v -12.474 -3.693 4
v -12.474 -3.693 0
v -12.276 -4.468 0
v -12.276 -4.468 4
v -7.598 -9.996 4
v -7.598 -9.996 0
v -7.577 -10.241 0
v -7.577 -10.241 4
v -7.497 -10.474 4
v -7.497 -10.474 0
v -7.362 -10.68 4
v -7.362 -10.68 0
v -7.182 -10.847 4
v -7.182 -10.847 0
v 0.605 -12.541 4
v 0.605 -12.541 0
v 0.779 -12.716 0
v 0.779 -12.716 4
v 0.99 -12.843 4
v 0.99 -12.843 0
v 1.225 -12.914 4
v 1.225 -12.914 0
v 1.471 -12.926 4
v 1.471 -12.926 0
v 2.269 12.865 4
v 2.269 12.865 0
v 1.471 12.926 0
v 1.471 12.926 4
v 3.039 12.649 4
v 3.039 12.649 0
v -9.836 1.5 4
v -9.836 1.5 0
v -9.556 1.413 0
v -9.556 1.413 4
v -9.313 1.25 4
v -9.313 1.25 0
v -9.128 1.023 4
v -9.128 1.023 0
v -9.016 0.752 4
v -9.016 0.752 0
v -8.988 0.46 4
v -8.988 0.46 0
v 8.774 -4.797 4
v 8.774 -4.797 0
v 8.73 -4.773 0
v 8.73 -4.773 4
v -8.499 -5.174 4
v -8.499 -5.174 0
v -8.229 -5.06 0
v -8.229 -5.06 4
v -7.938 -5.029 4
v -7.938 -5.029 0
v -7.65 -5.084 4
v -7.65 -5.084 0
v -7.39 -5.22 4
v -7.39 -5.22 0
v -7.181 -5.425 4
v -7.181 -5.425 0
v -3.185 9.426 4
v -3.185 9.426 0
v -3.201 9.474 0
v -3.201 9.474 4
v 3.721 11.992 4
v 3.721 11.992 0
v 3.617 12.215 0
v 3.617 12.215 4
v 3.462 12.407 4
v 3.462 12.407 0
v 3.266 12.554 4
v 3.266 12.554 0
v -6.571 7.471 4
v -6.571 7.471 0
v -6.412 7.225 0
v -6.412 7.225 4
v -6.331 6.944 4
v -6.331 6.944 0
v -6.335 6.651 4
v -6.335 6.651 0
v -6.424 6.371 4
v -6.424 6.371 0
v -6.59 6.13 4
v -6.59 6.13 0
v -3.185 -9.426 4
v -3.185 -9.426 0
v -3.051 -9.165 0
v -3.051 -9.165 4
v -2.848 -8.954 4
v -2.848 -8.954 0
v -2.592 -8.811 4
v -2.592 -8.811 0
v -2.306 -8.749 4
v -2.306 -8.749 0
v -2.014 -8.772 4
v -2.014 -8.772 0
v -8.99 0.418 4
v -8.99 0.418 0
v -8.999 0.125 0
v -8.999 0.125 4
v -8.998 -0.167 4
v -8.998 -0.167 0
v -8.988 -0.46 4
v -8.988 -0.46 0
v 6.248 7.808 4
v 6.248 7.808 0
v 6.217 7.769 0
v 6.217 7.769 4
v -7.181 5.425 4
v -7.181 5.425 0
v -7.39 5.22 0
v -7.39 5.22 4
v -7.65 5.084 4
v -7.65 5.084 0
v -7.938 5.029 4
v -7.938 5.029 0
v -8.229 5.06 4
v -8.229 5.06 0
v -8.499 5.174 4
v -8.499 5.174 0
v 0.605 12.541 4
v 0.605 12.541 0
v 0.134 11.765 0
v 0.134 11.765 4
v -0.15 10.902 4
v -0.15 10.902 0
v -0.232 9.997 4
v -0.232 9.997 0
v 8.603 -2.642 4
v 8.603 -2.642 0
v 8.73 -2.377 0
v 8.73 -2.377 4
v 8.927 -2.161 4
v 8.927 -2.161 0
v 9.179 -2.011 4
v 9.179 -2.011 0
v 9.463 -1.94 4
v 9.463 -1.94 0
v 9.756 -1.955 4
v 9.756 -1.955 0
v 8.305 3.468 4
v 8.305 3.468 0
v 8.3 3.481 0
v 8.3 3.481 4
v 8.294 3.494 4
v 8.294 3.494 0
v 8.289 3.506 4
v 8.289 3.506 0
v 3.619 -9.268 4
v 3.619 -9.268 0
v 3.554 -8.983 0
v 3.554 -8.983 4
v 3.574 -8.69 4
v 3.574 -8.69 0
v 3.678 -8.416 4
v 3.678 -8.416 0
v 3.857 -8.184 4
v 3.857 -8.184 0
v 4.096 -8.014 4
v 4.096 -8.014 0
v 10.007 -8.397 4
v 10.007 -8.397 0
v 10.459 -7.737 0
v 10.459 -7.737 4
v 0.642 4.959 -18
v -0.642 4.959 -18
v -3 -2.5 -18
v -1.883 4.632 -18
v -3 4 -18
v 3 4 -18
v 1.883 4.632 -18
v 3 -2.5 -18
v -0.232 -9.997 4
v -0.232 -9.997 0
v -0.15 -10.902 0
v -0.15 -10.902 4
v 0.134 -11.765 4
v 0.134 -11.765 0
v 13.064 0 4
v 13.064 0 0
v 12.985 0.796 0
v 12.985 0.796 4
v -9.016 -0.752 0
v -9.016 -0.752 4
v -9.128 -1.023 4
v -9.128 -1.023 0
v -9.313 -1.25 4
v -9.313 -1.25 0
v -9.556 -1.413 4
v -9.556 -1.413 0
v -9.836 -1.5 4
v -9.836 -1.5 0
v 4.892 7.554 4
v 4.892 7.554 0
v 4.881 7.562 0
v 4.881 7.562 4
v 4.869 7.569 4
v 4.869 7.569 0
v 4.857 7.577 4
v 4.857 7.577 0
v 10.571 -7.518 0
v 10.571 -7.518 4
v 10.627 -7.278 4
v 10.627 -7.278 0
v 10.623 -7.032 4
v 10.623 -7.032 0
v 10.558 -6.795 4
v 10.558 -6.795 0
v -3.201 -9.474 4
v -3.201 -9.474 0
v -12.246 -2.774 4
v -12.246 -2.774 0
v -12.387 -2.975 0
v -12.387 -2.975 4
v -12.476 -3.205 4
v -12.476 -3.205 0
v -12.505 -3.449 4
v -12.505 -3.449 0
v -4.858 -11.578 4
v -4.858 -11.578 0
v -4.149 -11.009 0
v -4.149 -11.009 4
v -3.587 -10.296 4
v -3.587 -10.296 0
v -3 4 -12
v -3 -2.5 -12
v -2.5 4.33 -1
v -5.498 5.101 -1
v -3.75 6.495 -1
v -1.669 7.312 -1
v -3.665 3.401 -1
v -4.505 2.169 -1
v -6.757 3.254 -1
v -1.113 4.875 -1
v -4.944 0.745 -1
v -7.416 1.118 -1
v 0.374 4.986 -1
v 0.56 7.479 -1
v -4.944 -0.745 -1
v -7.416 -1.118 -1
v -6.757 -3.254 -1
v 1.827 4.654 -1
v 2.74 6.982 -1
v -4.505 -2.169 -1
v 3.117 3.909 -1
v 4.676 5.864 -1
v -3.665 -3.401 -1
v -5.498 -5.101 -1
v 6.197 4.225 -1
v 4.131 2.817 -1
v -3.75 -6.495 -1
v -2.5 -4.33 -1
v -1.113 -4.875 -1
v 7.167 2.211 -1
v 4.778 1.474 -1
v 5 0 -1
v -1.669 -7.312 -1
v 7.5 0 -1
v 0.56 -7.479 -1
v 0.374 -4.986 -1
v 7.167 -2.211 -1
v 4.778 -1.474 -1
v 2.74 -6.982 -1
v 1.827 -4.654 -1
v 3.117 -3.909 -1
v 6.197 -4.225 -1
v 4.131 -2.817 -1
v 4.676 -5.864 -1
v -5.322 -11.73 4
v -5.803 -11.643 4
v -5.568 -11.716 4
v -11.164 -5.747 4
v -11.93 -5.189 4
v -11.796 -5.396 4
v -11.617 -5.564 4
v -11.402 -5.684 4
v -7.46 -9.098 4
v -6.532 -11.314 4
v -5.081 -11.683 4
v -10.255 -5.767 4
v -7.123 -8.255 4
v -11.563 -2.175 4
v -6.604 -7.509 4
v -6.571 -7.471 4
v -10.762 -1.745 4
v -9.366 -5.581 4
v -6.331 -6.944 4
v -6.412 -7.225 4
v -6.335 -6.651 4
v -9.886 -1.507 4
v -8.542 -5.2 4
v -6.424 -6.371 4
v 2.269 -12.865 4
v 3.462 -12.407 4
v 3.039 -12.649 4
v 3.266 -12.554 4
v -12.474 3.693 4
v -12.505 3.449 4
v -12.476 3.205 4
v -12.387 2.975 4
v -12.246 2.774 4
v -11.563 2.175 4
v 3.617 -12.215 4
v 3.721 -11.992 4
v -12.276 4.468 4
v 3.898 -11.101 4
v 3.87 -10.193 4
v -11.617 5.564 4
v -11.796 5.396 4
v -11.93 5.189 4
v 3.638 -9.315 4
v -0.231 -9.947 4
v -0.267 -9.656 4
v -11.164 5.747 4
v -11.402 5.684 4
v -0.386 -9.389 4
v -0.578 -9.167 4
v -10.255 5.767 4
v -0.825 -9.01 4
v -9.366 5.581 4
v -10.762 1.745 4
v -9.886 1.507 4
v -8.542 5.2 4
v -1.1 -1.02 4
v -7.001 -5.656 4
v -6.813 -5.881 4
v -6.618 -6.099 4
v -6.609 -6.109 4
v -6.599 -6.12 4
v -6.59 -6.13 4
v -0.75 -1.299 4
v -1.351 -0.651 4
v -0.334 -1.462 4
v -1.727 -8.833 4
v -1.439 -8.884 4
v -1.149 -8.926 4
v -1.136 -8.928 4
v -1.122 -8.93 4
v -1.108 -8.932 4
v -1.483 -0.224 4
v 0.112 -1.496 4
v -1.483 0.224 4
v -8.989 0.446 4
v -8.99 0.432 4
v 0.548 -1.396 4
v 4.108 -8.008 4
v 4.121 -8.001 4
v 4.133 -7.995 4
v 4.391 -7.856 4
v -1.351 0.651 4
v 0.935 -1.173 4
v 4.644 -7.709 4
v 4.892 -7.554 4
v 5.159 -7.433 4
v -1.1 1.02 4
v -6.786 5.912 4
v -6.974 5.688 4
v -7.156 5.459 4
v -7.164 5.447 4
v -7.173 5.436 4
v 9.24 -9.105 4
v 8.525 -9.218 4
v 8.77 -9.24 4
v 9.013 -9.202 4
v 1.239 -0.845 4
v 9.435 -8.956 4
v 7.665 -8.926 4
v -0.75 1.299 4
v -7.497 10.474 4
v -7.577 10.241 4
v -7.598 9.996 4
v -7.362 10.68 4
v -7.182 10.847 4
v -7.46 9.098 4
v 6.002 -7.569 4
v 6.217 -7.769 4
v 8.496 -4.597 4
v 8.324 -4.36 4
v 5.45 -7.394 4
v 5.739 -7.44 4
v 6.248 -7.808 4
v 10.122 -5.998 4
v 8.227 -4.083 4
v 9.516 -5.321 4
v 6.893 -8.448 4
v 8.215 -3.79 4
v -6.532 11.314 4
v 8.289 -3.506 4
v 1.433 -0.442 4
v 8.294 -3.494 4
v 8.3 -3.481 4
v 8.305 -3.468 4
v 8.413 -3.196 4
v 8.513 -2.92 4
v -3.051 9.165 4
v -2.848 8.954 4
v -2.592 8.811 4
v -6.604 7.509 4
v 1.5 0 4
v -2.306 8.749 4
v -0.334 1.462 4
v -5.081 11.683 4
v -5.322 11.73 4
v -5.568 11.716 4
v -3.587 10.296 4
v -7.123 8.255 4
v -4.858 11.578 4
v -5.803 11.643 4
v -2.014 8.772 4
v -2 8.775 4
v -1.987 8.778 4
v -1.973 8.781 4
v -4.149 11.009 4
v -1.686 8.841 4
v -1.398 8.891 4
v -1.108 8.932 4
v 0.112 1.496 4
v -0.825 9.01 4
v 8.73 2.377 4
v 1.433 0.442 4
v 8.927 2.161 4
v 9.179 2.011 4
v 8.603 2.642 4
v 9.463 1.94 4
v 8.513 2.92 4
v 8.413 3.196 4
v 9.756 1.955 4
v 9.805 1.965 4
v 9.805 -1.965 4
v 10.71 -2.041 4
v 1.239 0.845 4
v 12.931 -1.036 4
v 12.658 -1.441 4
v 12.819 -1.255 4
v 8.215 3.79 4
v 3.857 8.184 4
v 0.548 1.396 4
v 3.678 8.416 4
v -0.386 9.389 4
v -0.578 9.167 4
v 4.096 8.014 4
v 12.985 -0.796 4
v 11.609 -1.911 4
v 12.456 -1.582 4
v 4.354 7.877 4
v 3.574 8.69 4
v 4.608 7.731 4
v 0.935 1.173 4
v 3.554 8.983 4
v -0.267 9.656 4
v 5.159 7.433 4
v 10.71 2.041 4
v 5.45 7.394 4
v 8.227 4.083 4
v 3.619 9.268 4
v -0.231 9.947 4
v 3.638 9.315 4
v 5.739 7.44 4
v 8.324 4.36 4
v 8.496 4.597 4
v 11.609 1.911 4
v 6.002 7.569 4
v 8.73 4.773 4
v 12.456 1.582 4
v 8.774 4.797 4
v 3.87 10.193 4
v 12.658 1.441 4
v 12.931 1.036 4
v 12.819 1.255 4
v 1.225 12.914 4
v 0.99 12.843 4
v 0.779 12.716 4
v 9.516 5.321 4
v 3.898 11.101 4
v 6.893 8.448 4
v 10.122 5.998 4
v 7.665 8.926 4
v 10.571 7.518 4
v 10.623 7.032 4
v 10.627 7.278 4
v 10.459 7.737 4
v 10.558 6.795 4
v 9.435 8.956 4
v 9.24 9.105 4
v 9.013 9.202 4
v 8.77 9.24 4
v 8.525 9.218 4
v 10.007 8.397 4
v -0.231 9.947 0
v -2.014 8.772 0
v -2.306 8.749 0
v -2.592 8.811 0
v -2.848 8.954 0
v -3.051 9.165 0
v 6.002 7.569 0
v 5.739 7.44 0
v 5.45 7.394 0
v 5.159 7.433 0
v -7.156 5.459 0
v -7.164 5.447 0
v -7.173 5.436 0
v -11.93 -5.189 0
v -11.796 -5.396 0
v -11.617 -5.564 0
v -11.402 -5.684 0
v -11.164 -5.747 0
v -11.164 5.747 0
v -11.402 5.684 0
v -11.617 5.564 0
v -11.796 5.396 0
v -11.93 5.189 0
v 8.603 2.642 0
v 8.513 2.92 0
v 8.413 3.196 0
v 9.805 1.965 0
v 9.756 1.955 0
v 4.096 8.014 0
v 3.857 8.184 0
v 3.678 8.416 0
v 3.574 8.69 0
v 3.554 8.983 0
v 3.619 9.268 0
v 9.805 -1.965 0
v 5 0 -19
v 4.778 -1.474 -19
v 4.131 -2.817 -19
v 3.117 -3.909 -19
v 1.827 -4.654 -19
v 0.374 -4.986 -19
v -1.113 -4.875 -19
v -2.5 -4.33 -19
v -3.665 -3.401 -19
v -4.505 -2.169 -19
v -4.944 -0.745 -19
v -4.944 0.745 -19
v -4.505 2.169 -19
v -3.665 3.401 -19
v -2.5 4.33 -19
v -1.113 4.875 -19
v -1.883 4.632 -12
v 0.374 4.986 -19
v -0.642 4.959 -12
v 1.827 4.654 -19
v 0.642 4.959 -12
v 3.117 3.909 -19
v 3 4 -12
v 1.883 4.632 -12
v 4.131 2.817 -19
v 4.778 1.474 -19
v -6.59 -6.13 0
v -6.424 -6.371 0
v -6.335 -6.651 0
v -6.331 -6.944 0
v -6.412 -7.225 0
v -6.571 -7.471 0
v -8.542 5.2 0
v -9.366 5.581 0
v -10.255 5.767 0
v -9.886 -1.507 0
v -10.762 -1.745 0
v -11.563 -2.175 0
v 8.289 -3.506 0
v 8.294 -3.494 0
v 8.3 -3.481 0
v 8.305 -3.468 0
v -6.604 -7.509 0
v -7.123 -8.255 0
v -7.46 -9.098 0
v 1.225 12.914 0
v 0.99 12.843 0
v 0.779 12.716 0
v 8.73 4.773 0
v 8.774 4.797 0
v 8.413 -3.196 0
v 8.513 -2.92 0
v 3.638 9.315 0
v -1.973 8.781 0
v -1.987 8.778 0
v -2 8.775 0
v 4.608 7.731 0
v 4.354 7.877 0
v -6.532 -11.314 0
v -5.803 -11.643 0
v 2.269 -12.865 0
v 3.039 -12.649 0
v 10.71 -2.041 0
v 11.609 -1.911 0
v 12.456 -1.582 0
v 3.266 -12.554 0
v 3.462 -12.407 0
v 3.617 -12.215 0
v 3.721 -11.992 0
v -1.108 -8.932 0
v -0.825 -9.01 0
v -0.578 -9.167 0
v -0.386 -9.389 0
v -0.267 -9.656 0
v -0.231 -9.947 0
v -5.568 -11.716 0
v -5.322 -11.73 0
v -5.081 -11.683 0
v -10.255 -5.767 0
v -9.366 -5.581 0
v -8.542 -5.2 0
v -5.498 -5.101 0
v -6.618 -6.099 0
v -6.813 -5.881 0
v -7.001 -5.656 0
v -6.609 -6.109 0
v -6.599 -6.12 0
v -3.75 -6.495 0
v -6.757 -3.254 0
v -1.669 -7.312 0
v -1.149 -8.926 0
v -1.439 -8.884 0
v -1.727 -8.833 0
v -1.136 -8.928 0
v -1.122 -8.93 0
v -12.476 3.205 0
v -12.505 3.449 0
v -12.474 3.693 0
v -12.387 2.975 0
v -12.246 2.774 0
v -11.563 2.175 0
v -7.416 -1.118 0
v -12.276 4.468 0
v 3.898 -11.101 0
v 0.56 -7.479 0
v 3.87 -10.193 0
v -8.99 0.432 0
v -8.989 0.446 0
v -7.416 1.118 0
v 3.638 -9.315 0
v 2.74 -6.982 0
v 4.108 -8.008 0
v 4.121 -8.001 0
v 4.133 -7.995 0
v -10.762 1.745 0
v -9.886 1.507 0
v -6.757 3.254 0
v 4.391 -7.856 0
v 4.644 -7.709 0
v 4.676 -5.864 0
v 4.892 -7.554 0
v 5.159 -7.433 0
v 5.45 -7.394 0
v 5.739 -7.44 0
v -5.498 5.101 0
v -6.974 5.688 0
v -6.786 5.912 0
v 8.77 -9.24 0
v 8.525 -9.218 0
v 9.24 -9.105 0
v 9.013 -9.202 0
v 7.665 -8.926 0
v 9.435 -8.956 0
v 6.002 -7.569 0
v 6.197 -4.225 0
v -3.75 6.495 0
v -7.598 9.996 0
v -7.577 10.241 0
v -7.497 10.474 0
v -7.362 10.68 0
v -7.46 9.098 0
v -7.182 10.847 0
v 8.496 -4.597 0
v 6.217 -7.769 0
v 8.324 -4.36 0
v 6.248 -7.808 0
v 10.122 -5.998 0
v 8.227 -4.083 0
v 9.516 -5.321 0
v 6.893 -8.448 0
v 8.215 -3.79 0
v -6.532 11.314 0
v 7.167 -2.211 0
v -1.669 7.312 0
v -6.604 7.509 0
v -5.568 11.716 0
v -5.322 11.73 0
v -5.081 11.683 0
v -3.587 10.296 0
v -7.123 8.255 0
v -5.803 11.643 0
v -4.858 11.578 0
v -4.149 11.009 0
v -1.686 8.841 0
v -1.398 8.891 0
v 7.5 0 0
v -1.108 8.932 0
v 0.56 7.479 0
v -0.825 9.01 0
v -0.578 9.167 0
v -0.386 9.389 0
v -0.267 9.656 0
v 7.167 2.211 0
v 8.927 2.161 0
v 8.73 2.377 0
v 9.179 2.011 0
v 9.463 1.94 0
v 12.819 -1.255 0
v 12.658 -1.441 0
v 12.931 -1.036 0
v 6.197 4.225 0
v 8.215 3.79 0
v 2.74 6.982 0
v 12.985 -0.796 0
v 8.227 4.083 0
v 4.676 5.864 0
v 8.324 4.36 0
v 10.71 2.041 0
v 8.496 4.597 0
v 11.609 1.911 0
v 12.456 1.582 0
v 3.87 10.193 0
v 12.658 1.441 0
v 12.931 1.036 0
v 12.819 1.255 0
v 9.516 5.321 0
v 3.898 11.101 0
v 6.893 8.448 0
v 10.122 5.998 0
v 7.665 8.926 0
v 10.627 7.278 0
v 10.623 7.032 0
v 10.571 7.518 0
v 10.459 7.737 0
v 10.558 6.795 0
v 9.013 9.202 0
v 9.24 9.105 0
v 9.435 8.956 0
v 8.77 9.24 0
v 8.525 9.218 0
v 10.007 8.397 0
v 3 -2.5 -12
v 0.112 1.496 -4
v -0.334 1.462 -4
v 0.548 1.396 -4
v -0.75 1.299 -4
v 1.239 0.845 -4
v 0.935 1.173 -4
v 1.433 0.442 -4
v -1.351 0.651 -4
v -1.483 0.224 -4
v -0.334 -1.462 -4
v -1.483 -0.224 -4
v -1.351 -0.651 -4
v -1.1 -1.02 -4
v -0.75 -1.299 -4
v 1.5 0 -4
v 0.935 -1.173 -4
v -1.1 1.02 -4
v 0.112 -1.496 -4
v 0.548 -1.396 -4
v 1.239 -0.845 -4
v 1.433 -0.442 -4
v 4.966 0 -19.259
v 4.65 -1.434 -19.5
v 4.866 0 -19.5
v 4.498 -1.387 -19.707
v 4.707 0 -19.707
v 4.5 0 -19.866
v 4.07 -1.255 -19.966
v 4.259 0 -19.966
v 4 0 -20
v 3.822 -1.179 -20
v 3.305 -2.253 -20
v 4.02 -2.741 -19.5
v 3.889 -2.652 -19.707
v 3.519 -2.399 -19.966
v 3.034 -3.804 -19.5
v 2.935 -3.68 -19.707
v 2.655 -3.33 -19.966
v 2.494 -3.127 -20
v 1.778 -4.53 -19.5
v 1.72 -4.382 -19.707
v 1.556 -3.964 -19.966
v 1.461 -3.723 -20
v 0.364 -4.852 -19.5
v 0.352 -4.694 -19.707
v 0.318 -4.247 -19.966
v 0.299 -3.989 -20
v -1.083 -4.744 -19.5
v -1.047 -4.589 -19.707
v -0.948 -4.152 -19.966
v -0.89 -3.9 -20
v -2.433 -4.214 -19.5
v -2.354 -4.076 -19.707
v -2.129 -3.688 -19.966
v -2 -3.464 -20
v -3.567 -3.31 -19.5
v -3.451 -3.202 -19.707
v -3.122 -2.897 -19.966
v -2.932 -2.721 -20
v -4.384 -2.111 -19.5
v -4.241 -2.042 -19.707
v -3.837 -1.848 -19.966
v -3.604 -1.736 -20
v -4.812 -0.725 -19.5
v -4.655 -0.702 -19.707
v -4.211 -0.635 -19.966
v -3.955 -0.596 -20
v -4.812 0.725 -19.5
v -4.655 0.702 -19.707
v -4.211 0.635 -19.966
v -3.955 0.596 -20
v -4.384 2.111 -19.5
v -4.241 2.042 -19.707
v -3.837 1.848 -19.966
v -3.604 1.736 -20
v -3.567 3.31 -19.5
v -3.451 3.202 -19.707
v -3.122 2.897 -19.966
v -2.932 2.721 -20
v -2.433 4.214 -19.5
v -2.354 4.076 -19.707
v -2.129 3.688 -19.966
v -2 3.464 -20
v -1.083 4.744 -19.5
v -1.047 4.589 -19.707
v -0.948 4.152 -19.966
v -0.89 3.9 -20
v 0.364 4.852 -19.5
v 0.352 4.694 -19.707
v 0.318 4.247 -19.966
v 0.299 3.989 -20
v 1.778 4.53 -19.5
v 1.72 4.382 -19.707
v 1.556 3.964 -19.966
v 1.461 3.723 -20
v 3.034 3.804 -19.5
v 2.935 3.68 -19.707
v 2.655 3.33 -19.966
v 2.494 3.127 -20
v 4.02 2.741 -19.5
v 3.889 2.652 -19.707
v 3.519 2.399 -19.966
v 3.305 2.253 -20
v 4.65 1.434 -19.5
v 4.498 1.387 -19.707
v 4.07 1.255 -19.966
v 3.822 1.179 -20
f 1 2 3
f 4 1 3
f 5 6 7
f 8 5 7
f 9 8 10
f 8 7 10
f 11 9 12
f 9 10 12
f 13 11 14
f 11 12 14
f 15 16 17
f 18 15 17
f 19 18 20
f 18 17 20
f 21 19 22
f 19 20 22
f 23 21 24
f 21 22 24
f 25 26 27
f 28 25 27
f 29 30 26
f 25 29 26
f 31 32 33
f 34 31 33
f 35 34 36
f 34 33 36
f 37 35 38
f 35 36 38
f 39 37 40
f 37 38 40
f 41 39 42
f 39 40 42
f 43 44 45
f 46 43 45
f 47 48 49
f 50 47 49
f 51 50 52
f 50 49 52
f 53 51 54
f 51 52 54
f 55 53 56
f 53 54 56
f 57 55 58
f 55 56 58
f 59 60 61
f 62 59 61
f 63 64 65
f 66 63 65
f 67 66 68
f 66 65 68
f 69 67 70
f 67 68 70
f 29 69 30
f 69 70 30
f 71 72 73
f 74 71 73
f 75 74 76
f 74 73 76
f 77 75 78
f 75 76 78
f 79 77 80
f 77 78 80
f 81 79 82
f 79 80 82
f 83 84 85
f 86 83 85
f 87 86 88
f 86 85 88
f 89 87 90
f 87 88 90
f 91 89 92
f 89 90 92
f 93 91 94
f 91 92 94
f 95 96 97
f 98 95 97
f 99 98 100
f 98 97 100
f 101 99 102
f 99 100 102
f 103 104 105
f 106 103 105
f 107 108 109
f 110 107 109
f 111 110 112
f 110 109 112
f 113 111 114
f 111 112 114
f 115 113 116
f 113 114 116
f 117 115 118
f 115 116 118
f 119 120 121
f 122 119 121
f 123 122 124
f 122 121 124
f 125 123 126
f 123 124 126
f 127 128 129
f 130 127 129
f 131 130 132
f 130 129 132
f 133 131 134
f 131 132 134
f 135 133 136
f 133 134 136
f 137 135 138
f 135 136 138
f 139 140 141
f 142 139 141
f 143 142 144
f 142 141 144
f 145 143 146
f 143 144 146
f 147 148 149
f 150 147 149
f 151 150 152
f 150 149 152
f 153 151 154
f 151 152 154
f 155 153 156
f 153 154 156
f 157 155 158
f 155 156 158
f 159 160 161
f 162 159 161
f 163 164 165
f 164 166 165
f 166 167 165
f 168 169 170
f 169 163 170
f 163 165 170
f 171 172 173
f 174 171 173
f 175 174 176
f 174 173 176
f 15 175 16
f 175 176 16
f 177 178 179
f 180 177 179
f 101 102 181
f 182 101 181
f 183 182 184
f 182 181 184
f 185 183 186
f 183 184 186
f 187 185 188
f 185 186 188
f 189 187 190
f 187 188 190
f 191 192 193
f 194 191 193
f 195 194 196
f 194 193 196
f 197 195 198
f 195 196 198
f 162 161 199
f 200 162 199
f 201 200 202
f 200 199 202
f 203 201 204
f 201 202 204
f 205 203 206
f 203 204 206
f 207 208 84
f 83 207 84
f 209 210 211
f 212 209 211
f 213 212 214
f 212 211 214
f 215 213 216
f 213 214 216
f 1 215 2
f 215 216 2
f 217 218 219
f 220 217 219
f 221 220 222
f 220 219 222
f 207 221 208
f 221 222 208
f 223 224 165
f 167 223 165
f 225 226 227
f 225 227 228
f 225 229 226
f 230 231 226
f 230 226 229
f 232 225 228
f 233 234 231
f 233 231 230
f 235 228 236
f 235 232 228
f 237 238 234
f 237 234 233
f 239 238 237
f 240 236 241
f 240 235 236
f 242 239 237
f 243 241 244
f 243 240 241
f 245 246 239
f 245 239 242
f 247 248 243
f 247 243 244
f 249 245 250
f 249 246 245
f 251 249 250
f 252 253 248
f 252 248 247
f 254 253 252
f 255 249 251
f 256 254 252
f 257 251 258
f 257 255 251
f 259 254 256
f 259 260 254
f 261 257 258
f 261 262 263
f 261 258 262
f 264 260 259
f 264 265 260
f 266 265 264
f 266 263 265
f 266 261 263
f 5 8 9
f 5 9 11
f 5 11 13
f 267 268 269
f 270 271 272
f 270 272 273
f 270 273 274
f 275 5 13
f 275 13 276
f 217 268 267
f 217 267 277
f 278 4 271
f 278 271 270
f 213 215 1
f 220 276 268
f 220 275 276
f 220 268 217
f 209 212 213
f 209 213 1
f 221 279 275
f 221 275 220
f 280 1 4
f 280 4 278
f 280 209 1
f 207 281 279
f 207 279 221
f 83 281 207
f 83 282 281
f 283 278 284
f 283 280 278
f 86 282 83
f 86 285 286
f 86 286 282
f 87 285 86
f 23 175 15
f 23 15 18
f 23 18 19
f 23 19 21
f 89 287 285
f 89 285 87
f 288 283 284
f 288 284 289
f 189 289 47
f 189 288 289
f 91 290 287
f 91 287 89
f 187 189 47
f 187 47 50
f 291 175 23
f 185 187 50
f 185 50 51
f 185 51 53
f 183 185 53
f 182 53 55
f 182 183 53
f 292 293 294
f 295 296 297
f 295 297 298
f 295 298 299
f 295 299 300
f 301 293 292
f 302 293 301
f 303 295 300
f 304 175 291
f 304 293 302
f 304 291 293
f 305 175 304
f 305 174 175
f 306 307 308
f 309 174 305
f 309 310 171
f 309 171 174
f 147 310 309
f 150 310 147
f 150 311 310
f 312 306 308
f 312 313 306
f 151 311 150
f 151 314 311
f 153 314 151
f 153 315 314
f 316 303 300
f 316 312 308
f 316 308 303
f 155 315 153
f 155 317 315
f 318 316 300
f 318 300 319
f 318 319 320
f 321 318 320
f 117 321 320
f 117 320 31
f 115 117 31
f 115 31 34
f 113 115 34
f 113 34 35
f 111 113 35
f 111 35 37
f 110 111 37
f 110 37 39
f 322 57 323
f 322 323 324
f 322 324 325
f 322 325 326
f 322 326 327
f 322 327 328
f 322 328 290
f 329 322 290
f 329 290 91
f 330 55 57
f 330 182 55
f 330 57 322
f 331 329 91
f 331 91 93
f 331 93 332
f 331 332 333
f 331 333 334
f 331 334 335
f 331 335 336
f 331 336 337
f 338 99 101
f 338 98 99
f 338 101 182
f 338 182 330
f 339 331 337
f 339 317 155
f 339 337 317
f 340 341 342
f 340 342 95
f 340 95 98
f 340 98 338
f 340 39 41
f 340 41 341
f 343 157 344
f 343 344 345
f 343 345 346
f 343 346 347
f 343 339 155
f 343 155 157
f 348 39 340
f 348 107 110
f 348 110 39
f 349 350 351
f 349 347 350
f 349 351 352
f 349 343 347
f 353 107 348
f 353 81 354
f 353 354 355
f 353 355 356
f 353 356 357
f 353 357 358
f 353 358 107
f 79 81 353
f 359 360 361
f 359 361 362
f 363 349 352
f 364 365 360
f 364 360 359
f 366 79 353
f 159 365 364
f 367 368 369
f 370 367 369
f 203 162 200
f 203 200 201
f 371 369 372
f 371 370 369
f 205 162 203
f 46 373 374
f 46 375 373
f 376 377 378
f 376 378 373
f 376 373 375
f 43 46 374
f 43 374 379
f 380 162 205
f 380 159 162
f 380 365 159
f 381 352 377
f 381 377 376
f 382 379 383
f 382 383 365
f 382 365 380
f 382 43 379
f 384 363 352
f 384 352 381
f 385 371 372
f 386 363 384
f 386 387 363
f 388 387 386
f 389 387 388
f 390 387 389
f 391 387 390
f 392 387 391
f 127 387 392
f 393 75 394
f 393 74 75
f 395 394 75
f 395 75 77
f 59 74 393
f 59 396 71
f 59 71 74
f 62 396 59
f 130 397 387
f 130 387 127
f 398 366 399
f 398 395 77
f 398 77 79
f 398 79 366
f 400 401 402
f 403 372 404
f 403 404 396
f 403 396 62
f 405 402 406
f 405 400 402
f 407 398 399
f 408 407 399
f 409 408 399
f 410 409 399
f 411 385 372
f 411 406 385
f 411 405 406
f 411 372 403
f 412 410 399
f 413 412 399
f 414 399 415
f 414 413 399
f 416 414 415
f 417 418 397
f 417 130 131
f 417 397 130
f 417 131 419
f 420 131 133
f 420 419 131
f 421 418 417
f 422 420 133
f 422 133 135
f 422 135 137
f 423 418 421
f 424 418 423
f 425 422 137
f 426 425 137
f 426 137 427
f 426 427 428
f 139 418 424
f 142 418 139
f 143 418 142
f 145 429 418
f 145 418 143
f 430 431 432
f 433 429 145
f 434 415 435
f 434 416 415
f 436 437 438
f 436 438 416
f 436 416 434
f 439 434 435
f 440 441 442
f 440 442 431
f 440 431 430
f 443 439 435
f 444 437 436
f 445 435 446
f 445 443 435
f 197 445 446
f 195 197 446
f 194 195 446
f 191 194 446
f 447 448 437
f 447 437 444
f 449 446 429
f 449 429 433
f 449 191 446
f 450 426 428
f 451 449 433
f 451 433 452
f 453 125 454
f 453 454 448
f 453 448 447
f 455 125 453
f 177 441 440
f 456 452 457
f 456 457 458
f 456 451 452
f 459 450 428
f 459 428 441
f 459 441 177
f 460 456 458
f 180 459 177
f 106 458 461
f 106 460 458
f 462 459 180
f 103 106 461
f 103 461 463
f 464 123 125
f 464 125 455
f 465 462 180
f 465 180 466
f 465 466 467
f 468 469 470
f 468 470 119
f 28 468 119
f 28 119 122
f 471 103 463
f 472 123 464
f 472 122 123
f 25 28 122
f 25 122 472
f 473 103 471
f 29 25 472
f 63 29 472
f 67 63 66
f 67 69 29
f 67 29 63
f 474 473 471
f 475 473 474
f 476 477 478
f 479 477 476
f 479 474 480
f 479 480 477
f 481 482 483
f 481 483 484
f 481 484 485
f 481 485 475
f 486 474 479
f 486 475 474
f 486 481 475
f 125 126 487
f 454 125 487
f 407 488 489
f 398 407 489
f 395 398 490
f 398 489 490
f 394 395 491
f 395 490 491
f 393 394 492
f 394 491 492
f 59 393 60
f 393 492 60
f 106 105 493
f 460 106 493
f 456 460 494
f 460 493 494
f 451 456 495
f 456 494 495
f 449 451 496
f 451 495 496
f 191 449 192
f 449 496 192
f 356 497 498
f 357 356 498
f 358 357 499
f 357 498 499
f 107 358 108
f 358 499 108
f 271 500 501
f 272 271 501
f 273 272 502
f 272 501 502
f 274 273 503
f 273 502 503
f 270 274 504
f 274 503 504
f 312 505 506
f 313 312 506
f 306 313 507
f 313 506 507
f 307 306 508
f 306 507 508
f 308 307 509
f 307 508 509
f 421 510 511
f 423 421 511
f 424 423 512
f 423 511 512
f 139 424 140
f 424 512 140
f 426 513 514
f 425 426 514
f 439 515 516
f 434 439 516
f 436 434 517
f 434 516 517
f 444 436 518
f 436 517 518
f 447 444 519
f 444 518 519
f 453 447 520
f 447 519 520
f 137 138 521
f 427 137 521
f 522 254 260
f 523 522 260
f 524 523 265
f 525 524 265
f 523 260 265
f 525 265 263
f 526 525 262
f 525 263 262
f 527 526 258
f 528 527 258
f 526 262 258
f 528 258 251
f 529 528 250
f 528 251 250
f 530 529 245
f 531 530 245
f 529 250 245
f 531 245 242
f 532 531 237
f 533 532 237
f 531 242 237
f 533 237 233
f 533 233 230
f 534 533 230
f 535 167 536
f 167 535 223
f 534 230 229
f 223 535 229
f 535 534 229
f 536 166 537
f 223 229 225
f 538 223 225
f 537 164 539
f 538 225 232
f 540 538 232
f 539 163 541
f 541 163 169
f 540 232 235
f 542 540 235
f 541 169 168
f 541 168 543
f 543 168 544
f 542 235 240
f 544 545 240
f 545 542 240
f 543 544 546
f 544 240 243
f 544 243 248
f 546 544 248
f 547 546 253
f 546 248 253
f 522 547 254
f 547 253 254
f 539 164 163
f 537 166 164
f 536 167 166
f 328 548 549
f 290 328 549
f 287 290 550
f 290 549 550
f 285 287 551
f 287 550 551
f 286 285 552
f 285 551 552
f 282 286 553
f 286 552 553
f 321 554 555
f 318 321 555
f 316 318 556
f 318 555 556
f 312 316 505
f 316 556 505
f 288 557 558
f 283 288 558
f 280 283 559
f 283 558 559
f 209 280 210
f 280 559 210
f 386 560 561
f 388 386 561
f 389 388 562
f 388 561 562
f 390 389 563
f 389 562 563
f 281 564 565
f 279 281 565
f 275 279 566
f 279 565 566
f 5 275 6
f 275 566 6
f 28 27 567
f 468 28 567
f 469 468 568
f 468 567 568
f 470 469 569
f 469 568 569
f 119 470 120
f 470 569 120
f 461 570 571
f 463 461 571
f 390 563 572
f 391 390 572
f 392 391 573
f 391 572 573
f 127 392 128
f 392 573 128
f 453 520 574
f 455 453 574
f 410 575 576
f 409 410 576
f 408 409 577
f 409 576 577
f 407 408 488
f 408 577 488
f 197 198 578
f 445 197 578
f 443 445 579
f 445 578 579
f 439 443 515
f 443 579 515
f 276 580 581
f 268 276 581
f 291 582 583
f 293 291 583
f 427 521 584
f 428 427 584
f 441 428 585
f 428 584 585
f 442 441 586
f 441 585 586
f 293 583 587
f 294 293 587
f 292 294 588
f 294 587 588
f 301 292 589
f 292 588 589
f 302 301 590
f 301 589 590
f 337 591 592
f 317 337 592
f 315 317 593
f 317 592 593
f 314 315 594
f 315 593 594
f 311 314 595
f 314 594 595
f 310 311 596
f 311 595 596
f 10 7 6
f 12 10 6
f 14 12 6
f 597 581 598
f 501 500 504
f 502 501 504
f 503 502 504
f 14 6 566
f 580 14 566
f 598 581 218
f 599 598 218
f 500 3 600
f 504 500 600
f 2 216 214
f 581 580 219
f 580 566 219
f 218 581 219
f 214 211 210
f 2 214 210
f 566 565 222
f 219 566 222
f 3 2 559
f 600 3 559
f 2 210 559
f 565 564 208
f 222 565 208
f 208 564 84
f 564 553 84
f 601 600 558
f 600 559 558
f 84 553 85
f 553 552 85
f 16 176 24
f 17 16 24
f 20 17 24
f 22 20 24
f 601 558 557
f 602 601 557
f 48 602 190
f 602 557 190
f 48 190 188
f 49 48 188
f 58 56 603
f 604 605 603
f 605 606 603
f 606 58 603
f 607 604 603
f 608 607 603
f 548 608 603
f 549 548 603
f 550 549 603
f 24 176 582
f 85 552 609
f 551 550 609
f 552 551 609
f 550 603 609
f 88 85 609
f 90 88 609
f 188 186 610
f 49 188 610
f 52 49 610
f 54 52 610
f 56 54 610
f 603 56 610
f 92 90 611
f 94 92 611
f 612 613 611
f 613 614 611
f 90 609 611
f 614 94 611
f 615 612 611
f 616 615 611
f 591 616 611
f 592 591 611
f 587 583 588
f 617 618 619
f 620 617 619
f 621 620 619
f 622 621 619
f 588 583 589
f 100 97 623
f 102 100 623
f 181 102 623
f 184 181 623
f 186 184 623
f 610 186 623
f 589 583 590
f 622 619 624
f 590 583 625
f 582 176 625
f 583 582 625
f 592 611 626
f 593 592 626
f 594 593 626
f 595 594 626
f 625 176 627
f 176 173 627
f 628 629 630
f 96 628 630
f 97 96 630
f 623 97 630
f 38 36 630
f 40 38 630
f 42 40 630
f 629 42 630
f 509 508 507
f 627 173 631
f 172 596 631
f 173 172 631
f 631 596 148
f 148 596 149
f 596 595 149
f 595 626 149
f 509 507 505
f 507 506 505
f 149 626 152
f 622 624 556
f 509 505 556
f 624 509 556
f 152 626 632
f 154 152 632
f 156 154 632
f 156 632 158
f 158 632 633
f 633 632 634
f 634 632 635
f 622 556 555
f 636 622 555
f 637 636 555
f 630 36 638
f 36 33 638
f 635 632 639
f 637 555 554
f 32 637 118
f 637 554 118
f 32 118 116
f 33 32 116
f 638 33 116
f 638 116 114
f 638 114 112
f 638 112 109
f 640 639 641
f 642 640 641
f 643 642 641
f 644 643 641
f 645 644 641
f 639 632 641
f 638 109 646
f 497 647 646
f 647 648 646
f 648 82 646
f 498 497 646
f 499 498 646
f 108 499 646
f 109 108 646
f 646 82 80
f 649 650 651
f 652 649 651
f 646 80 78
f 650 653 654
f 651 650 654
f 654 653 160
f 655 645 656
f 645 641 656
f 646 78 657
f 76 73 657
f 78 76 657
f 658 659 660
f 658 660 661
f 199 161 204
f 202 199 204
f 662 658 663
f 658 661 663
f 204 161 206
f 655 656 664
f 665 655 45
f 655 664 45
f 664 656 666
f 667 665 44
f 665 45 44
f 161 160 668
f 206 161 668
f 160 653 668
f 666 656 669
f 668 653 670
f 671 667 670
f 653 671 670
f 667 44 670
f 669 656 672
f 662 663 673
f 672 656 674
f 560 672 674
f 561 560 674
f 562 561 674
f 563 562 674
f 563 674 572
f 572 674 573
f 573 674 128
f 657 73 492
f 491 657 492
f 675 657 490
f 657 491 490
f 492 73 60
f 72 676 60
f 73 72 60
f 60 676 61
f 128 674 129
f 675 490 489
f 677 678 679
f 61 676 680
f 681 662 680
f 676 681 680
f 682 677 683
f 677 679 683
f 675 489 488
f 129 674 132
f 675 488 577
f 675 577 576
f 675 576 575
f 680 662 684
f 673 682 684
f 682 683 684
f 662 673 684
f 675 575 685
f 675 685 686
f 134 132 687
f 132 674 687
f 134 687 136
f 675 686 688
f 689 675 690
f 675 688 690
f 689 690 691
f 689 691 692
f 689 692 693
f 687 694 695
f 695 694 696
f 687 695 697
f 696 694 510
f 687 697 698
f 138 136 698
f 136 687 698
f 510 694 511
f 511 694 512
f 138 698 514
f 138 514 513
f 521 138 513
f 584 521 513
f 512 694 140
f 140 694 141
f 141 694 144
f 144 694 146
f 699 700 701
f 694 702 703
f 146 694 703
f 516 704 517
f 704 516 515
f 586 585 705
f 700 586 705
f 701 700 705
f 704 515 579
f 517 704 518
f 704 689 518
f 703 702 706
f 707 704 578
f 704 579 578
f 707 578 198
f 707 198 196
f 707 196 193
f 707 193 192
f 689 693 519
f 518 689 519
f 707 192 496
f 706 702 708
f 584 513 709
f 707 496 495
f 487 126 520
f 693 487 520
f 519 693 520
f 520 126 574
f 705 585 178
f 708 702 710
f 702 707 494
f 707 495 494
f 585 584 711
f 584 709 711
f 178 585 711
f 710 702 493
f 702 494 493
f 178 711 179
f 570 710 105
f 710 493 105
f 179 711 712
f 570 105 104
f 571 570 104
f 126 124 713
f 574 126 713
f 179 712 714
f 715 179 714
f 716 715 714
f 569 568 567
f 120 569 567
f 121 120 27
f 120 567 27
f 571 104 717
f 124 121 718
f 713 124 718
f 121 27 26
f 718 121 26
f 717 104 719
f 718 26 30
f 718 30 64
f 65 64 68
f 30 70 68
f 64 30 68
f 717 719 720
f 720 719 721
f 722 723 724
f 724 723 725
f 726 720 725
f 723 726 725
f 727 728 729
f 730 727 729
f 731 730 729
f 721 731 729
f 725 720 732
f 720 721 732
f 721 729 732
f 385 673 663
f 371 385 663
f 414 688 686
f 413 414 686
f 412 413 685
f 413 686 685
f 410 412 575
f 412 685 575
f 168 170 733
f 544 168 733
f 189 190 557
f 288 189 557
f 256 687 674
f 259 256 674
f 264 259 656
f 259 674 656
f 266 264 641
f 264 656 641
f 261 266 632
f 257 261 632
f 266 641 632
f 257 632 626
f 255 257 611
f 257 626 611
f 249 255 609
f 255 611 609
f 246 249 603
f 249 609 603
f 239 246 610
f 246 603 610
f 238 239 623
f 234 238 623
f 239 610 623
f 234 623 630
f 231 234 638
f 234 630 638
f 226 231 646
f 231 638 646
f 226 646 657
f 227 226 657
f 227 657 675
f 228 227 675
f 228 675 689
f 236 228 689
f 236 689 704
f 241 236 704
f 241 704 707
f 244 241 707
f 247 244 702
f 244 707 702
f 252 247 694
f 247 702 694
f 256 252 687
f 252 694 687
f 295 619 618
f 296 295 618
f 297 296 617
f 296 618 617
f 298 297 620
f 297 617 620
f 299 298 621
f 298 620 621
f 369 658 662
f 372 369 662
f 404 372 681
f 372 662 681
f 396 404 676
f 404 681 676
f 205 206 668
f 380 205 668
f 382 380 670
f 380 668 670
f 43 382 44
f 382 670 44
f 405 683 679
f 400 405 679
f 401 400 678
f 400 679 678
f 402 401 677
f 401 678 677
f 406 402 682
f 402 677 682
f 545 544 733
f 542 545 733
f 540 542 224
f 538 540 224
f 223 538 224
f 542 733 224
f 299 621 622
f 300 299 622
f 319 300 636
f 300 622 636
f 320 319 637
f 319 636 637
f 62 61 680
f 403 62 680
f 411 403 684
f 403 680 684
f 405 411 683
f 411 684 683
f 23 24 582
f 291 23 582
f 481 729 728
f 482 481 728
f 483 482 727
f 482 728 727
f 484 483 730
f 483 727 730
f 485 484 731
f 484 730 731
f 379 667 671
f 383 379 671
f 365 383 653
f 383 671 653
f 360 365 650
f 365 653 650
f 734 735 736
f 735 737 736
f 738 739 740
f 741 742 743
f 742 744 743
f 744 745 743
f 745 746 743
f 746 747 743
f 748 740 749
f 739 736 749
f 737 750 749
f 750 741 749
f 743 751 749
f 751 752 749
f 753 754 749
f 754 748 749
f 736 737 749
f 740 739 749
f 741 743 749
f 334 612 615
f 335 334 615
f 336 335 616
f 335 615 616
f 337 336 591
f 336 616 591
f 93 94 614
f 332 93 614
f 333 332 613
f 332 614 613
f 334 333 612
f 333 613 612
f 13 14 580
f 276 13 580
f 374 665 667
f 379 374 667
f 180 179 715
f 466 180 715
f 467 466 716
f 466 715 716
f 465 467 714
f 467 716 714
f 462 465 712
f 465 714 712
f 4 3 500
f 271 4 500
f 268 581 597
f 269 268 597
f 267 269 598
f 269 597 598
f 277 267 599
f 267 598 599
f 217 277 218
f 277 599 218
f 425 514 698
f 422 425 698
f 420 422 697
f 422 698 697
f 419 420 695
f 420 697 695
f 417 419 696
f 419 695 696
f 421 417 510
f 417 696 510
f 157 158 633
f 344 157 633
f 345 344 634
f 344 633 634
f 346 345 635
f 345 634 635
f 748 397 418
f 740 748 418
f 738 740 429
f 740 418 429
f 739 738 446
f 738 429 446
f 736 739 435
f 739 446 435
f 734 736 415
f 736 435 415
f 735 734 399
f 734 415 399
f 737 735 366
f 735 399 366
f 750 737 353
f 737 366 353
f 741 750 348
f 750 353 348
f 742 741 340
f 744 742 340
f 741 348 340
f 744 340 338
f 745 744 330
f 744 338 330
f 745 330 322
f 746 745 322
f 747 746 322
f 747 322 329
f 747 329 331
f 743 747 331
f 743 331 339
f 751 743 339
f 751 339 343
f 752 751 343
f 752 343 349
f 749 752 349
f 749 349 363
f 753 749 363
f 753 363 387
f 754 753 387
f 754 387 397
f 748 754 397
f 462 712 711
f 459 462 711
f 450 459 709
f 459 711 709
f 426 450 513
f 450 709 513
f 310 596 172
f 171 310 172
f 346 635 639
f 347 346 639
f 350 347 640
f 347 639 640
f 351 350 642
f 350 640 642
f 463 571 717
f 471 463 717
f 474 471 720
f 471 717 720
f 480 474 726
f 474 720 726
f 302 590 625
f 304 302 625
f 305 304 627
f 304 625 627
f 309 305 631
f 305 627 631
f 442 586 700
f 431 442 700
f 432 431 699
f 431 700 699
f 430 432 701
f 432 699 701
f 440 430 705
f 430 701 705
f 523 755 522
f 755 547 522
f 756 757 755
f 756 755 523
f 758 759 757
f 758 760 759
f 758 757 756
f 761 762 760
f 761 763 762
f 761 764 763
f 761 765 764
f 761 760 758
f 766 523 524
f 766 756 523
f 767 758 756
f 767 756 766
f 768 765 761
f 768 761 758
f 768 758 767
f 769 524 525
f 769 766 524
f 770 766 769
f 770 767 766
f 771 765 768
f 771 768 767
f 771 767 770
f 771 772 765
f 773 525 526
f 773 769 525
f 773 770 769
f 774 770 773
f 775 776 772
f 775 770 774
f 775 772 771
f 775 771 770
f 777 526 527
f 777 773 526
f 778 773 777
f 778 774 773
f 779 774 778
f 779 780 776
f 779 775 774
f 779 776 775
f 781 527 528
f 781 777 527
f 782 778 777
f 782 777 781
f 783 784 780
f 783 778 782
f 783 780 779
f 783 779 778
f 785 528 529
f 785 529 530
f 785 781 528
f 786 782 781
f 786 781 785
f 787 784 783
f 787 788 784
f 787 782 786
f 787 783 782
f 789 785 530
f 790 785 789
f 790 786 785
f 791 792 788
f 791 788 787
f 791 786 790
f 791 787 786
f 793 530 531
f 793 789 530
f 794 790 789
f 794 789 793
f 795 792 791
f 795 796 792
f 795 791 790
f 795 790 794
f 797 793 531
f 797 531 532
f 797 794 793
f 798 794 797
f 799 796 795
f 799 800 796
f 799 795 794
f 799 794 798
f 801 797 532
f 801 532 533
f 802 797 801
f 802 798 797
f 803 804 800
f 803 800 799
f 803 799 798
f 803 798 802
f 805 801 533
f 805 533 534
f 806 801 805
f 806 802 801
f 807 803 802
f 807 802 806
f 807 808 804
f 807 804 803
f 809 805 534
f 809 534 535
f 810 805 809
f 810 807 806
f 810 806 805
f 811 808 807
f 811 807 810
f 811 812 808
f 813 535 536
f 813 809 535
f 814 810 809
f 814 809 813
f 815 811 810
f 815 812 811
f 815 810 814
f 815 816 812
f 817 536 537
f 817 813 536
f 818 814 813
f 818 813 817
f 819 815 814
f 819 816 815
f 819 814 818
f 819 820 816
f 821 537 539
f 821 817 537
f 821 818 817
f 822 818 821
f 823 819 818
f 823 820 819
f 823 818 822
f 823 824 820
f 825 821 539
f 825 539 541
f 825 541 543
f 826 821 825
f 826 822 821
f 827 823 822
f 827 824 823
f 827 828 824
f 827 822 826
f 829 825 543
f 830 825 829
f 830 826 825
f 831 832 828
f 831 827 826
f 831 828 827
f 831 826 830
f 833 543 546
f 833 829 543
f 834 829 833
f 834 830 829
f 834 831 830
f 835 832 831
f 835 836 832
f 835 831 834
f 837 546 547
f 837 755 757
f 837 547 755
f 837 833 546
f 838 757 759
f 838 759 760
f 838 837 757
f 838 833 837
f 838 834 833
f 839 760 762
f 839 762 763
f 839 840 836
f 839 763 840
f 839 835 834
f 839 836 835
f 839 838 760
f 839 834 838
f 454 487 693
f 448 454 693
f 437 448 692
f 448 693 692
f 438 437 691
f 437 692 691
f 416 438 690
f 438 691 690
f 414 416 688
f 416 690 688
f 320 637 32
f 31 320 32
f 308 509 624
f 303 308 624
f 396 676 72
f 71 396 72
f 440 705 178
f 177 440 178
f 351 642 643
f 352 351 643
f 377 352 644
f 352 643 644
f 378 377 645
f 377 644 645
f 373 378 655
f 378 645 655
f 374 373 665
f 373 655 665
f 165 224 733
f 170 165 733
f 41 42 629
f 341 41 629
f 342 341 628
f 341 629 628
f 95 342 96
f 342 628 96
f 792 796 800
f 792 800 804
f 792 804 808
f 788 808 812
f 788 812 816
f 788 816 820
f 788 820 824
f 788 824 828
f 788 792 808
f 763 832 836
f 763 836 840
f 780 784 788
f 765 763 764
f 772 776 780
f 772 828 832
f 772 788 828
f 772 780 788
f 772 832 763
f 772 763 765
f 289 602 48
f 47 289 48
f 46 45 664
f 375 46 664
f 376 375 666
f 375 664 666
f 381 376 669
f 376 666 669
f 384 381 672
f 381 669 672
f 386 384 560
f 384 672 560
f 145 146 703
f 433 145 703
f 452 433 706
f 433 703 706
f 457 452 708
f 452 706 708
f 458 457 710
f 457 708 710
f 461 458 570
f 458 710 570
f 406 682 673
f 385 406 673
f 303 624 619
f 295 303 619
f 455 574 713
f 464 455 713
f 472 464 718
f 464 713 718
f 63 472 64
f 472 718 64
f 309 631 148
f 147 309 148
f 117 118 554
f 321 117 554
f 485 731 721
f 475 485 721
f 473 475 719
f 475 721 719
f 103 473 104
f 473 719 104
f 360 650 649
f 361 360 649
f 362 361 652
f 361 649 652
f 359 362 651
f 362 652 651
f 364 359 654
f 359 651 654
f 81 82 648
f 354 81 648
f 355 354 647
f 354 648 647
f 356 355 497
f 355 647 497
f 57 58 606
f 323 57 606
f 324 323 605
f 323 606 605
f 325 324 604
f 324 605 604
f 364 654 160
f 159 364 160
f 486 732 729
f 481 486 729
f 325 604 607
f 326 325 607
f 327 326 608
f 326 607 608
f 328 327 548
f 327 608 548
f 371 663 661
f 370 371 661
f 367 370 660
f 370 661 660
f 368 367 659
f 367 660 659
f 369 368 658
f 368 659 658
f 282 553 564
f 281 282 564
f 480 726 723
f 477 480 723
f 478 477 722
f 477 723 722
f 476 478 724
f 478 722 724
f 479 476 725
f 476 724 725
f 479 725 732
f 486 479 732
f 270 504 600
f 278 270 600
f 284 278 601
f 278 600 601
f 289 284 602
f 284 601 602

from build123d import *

# Parameters (mm, degrees)
F1_DEPTH  = 4
F2_COUNT  = 9
F4_R      = 1.5
F5_DEPTH  = 4
F6_R      = 5
F7_DEPTH  = 20
F8_DEPTH  = 4
F10_DEPTH = 6
F11_DEPTH = 2.5
F12_R     = 1
F13_R     = 7.5
F13_R_2   = 5
F14_DEPTH = 1


with BuildPart() as f1:
    # F0 (on Top) → F1 (new body)
    with BuildSketch(Plane.XY):
        with BuildLine():
            Line((8.3050784754, 3.467805), (0, 0))
            Line((0, 0), (8.3050784754, -3.467805))
            ThreePointArc((8.3050784754, -3.467805), (8.4643613218, -3.0585270007), (8.6034885901, -2.6419659499))
            ThreePointArc((8.6034885901, -2.6419659499), (9.047405848, -2.0765477235), (9.7559177746, -1.9550110935))
            Line((9.7559177746, -1.9550110935), (9.805066286, -1.9648600782))
            ThreePointArc((9.805066286, -1.9648600782), (11.1634165035, -2.0017278276), (12.4557678163, -1.5818437618))
            ThreePointArc((12.4557678163, -1.5818437618), (12.8193292248, -1.2554624828), (12.9848699654, -0.7957909694))
            Line((12.9848699654, -0.7957909694), (13.0638203653, 0))
            Line((13.0638203653, 0), (12.9848699654, 0.7957909694))
            ThreePointArc((12.9848699654, 0.7957909694), (12.8193292248, 1.2554624828), (12.4557678163, 1.5818437618))
            ThreePointArc((12.4557678163, 1.5818437618), (11.1634165035, 2.0017278276), (9.805066286, 1.9648600782))
            Line((9.805066286, 1.9648600782), (9.7559177746, 1.9550110935))
            ThreePointArc((9.7559177746, 1.9550110935), (9.047405848, 2.0765477235), (8.6034885901, 2.6419659499))
            ThreePointArc((8.6034885901, 2.6419659499), (8.4643613218, 3.0585270007), (8.3050784754, 3.467805))
        make_face()
    extrude(amount=F1_DEPTH)


with BuildPart() as f2_1:
    # F2: instance of F1
    add(f1.part.rotate(Axis((0, 0, 2), (0, 0, -1)), 1 * 360 / F2_COUNT))


with BuildPart() as f2_2:
    # F2: instance of F1
    add(f1.part.rotate(Axis((0, 0, 2), (0, 0, -1)), 2 * 360 / F2_COUNT))


with BuildPart() as f2_3:
    # F2: instance of F1
    add(f1.part.rotate(Axis((0, 0, 2), (0, 0, -1)), 3 * 360 / F2_COUNT))


with BuildPart() as f2_4:
    # F2: instance of F1
    add(f1.part.rotate(Axis((0, 0, 2), (0, 0, -1)), 4 * 360 / F2_COUNT))


with BuildPart() as f2_5:
    # F2: instance of F1
    add(f1.part.rotate(Axis((0, 0, 2), (0, 0, -1)), 5 * 360 / F2_COUNT))


with BuildPart() as f2_6:
    # F2: instance of F1
    add(f1.part.rotate(Axis((0, 0, 2), (0, 0, -1)), 6 * 360 / F2_COUNT))


with BuildPart() as f2_7:
    # F2: instance of F1
    add(f1.part.rotate(Axis((0, 0, 2), (0, 0, -1)), 7 * 360 / F2_COUNT))


with BuildPart() as f2_8:
    # F2: instance of F1
    add(f1.part.rotate(Axis((0, 0, 2), (0, 0, -1)), 8 * 360 / F2_COUNT))


with BuildPart() as f2_7_1:
    add(f2_7.part)

    # F3: union F2_6, F2_4, F2_5, F1, F2_1, F2_3, F2_2, F2_8
    add(f2_6.part)
    add(f2_4.part)
    add(f2_5.part)
    add(f1.part)
    add(f2_1.part)
    add(f2_3.part)
    add(f2_2.part)
    add(f2_8.part)

    # F4 (on face) → F5 (cut, through all)
    with BuildSketch(Plane.XY.offset(4)):
        Circle(F4_R)
    extrude(amount=-F5_DEPTH, mode=Mode.SUBTRACT)

    # F6 (on face) → F7 (join)
    with BuildSketch(Plane(origin=(0, 0, 0), x_dir=(1, 0, 0), z_dir=(0, 0, -1))):
        Circle(F6_R)
    extrude(amount=F7_DEPTH)

    # F8 (cut): a face of the model
    f8_faces = [f2_7_1.faces().sort_by_distance(p)[0] for p in [
        (0, 0, 0),
    ]]
    extrude(f8_faces, amount=-F8_DEPTH, mode=Mode.SUBTRACT)

    # F9 (on Front) → F10 (cut, up to face)
    with BuildSketch(Plane.XZ):
        Polygon((3, -12), (0, -12), (-3, -12), (-3, -18), (3, -18), align=None)
    extrude(amount=-F10_DEPTH, mode=Mode.SUBTRACT)

    # F11 (cut): a face of the model
    f11_faces = [f2_7_1.faces().sort_by_distance(p)[0] for p in [
        (0, 0, -15),
    ]]
    extrude(f11_faces, amount=-F11_DEPTH, mode=Mode.SUBTRACT)

    # F12
    f12_edges = [f2_7_1.edges().sort_by_distance(p)[0] for p in [
        (-5, 0, -20),
    ]]
    fillet(f12_edges, radius=F12_R)

    # F13 (on face) → F14 (join)
    with BuildSketch(Plane(origin=(0, 0, 0), x_dir=(1, 0, 0), z_dir=(0, 0, -1))):
        Circle(F13_R)
        Circle(F13_R_2, mode=Mode.SUBTRACT)
    extrude(amount=F14_DEPTH)


solid = f2_7_1.part
